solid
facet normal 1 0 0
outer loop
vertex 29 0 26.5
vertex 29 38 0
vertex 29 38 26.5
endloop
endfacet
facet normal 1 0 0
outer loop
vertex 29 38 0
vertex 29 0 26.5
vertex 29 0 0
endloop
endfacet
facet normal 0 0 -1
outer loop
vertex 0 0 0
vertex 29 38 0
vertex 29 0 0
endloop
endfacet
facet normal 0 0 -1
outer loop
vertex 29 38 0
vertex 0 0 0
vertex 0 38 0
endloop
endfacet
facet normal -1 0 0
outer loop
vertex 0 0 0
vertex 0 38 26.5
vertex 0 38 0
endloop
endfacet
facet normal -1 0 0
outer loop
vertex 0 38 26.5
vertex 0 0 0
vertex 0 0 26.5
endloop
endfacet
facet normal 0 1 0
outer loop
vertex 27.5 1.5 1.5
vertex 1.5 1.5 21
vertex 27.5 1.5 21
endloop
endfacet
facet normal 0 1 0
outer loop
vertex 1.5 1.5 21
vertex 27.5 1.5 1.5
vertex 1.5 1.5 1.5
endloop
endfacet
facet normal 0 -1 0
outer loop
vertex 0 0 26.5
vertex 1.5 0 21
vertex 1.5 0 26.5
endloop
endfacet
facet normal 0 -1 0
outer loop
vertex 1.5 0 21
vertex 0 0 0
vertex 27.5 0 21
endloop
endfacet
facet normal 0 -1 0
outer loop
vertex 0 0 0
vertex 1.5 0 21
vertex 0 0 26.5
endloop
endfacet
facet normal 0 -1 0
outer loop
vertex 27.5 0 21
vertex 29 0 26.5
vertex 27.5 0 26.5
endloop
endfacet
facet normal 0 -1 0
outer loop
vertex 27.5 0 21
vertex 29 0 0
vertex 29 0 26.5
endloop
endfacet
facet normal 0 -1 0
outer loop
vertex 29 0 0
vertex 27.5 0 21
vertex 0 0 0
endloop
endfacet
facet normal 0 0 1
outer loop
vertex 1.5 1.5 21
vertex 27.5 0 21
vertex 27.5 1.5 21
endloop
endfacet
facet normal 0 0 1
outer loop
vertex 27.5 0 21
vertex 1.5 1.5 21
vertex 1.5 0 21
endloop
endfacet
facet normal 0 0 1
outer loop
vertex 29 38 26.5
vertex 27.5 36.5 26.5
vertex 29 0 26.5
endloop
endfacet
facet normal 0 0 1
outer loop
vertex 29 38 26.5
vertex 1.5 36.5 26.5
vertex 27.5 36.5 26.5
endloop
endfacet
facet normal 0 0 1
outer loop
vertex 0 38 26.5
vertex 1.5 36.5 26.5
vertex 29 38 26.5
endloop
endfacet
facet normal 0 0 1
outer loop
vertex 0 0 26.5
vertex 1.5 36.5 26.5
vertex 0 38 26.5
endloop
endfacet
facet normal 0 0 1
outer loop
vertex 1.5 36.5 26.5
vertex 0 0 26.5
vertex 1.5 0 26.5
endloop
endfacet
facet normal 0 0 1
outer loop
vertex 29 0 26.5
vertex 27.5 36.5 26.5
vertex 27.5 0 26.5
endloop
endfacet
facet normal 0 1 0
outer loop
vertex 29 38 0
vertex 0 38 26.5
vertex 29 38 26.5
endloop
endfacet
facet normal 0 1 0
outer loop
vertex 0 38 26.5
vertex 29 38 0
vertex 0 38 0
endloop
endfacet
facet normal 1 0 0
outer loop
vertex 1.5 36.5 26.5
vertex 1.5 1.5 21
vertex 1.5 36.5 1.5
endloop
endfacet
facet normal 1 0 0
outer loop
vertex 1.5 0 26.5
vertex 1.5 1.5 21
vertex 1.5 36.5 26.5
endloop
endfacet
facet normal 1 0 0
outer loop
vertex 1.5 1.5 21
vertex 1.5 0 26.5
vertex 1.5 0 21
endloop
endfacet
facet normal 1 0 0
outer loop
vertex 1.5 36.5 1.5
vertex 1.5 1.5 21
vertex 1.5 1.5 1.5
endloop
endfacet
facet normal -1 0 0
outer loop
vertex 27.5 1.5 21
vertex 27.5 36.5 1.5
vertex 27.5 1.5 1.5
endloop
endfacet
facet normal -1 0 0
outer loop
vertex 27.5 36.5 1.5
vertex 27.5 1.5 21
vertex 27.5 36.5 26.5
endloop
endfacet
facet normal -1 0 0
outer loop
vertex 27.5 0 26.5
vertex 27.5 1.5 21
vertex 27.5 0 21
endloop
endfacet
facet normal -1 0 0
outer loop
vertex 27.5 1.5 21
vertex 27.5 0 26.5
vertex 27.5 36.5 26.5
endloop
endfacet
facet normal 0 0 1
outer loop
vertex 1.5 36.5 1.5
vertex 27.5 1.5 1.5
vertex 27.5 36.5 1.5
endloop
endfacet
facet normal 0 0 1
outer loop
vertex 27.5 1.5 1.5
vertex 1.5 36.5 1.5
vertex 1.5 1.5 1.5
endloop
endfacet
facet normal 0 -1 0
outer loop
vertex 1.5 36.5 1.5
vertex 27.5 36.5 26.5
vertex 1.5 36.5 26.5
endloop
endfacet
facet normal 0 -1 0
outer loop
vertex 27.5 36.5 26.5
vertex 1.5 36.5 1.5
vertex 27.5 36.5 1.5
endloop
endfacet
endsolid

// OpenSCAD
l=35;
w=26;
h=25;
t=1.5;

slot=0.0;
trim=5.5;

module cutout(x,z,len,height)
{
    translate([x+t,-t,z+t]){
        cube([len,3*t,height]);
    }
}

// Bottom
cube([w+2*t,l+2*t,t]);


// Front
translate([0,0,0]){
    rotate([0,0,0]){ 
        difference(){
           cube([w+2*t,t,h+t]);
            
           translate([0,-t,h+t-trim]){
               cube([w*2*t,3*t,trim]);
           }
           //cutout(3,15,20,3);
           //cutout(7,0,12,12);
        }
    }
}

// Back
translate([w+2*t,l+2*t,0]){
    rotate([0,0,180]){
        difference(){
           cube([w+2*t,t,h+t]);
            
            //cutout(1.5,15,23,3);
        }
    }
}

// Left
translate([0,l+2*t,0]){
    rotate([0,0,-90]){ 
        difference() {
           cube([l+2*t,t,h+t]);
           translate([0,t-slot,h+t-slot-1]){
               cube([l+2*t,slot+.2,slot]);
           }
            //cutout(7.5,15,20,3);
        }
    }
}

// Right
translate([w+2*t,0,0]){
    rotate([0,0,90]){
        difference(){ 
           cube([l+2*t,t,h+t]);
            
            translate([0,t-slot,h+t-slot-1]){
               cube([l+2*t,slot+0.2,slot]);
           }
            //cutout(7.5,15,20,3);
            
        }
    }
}
